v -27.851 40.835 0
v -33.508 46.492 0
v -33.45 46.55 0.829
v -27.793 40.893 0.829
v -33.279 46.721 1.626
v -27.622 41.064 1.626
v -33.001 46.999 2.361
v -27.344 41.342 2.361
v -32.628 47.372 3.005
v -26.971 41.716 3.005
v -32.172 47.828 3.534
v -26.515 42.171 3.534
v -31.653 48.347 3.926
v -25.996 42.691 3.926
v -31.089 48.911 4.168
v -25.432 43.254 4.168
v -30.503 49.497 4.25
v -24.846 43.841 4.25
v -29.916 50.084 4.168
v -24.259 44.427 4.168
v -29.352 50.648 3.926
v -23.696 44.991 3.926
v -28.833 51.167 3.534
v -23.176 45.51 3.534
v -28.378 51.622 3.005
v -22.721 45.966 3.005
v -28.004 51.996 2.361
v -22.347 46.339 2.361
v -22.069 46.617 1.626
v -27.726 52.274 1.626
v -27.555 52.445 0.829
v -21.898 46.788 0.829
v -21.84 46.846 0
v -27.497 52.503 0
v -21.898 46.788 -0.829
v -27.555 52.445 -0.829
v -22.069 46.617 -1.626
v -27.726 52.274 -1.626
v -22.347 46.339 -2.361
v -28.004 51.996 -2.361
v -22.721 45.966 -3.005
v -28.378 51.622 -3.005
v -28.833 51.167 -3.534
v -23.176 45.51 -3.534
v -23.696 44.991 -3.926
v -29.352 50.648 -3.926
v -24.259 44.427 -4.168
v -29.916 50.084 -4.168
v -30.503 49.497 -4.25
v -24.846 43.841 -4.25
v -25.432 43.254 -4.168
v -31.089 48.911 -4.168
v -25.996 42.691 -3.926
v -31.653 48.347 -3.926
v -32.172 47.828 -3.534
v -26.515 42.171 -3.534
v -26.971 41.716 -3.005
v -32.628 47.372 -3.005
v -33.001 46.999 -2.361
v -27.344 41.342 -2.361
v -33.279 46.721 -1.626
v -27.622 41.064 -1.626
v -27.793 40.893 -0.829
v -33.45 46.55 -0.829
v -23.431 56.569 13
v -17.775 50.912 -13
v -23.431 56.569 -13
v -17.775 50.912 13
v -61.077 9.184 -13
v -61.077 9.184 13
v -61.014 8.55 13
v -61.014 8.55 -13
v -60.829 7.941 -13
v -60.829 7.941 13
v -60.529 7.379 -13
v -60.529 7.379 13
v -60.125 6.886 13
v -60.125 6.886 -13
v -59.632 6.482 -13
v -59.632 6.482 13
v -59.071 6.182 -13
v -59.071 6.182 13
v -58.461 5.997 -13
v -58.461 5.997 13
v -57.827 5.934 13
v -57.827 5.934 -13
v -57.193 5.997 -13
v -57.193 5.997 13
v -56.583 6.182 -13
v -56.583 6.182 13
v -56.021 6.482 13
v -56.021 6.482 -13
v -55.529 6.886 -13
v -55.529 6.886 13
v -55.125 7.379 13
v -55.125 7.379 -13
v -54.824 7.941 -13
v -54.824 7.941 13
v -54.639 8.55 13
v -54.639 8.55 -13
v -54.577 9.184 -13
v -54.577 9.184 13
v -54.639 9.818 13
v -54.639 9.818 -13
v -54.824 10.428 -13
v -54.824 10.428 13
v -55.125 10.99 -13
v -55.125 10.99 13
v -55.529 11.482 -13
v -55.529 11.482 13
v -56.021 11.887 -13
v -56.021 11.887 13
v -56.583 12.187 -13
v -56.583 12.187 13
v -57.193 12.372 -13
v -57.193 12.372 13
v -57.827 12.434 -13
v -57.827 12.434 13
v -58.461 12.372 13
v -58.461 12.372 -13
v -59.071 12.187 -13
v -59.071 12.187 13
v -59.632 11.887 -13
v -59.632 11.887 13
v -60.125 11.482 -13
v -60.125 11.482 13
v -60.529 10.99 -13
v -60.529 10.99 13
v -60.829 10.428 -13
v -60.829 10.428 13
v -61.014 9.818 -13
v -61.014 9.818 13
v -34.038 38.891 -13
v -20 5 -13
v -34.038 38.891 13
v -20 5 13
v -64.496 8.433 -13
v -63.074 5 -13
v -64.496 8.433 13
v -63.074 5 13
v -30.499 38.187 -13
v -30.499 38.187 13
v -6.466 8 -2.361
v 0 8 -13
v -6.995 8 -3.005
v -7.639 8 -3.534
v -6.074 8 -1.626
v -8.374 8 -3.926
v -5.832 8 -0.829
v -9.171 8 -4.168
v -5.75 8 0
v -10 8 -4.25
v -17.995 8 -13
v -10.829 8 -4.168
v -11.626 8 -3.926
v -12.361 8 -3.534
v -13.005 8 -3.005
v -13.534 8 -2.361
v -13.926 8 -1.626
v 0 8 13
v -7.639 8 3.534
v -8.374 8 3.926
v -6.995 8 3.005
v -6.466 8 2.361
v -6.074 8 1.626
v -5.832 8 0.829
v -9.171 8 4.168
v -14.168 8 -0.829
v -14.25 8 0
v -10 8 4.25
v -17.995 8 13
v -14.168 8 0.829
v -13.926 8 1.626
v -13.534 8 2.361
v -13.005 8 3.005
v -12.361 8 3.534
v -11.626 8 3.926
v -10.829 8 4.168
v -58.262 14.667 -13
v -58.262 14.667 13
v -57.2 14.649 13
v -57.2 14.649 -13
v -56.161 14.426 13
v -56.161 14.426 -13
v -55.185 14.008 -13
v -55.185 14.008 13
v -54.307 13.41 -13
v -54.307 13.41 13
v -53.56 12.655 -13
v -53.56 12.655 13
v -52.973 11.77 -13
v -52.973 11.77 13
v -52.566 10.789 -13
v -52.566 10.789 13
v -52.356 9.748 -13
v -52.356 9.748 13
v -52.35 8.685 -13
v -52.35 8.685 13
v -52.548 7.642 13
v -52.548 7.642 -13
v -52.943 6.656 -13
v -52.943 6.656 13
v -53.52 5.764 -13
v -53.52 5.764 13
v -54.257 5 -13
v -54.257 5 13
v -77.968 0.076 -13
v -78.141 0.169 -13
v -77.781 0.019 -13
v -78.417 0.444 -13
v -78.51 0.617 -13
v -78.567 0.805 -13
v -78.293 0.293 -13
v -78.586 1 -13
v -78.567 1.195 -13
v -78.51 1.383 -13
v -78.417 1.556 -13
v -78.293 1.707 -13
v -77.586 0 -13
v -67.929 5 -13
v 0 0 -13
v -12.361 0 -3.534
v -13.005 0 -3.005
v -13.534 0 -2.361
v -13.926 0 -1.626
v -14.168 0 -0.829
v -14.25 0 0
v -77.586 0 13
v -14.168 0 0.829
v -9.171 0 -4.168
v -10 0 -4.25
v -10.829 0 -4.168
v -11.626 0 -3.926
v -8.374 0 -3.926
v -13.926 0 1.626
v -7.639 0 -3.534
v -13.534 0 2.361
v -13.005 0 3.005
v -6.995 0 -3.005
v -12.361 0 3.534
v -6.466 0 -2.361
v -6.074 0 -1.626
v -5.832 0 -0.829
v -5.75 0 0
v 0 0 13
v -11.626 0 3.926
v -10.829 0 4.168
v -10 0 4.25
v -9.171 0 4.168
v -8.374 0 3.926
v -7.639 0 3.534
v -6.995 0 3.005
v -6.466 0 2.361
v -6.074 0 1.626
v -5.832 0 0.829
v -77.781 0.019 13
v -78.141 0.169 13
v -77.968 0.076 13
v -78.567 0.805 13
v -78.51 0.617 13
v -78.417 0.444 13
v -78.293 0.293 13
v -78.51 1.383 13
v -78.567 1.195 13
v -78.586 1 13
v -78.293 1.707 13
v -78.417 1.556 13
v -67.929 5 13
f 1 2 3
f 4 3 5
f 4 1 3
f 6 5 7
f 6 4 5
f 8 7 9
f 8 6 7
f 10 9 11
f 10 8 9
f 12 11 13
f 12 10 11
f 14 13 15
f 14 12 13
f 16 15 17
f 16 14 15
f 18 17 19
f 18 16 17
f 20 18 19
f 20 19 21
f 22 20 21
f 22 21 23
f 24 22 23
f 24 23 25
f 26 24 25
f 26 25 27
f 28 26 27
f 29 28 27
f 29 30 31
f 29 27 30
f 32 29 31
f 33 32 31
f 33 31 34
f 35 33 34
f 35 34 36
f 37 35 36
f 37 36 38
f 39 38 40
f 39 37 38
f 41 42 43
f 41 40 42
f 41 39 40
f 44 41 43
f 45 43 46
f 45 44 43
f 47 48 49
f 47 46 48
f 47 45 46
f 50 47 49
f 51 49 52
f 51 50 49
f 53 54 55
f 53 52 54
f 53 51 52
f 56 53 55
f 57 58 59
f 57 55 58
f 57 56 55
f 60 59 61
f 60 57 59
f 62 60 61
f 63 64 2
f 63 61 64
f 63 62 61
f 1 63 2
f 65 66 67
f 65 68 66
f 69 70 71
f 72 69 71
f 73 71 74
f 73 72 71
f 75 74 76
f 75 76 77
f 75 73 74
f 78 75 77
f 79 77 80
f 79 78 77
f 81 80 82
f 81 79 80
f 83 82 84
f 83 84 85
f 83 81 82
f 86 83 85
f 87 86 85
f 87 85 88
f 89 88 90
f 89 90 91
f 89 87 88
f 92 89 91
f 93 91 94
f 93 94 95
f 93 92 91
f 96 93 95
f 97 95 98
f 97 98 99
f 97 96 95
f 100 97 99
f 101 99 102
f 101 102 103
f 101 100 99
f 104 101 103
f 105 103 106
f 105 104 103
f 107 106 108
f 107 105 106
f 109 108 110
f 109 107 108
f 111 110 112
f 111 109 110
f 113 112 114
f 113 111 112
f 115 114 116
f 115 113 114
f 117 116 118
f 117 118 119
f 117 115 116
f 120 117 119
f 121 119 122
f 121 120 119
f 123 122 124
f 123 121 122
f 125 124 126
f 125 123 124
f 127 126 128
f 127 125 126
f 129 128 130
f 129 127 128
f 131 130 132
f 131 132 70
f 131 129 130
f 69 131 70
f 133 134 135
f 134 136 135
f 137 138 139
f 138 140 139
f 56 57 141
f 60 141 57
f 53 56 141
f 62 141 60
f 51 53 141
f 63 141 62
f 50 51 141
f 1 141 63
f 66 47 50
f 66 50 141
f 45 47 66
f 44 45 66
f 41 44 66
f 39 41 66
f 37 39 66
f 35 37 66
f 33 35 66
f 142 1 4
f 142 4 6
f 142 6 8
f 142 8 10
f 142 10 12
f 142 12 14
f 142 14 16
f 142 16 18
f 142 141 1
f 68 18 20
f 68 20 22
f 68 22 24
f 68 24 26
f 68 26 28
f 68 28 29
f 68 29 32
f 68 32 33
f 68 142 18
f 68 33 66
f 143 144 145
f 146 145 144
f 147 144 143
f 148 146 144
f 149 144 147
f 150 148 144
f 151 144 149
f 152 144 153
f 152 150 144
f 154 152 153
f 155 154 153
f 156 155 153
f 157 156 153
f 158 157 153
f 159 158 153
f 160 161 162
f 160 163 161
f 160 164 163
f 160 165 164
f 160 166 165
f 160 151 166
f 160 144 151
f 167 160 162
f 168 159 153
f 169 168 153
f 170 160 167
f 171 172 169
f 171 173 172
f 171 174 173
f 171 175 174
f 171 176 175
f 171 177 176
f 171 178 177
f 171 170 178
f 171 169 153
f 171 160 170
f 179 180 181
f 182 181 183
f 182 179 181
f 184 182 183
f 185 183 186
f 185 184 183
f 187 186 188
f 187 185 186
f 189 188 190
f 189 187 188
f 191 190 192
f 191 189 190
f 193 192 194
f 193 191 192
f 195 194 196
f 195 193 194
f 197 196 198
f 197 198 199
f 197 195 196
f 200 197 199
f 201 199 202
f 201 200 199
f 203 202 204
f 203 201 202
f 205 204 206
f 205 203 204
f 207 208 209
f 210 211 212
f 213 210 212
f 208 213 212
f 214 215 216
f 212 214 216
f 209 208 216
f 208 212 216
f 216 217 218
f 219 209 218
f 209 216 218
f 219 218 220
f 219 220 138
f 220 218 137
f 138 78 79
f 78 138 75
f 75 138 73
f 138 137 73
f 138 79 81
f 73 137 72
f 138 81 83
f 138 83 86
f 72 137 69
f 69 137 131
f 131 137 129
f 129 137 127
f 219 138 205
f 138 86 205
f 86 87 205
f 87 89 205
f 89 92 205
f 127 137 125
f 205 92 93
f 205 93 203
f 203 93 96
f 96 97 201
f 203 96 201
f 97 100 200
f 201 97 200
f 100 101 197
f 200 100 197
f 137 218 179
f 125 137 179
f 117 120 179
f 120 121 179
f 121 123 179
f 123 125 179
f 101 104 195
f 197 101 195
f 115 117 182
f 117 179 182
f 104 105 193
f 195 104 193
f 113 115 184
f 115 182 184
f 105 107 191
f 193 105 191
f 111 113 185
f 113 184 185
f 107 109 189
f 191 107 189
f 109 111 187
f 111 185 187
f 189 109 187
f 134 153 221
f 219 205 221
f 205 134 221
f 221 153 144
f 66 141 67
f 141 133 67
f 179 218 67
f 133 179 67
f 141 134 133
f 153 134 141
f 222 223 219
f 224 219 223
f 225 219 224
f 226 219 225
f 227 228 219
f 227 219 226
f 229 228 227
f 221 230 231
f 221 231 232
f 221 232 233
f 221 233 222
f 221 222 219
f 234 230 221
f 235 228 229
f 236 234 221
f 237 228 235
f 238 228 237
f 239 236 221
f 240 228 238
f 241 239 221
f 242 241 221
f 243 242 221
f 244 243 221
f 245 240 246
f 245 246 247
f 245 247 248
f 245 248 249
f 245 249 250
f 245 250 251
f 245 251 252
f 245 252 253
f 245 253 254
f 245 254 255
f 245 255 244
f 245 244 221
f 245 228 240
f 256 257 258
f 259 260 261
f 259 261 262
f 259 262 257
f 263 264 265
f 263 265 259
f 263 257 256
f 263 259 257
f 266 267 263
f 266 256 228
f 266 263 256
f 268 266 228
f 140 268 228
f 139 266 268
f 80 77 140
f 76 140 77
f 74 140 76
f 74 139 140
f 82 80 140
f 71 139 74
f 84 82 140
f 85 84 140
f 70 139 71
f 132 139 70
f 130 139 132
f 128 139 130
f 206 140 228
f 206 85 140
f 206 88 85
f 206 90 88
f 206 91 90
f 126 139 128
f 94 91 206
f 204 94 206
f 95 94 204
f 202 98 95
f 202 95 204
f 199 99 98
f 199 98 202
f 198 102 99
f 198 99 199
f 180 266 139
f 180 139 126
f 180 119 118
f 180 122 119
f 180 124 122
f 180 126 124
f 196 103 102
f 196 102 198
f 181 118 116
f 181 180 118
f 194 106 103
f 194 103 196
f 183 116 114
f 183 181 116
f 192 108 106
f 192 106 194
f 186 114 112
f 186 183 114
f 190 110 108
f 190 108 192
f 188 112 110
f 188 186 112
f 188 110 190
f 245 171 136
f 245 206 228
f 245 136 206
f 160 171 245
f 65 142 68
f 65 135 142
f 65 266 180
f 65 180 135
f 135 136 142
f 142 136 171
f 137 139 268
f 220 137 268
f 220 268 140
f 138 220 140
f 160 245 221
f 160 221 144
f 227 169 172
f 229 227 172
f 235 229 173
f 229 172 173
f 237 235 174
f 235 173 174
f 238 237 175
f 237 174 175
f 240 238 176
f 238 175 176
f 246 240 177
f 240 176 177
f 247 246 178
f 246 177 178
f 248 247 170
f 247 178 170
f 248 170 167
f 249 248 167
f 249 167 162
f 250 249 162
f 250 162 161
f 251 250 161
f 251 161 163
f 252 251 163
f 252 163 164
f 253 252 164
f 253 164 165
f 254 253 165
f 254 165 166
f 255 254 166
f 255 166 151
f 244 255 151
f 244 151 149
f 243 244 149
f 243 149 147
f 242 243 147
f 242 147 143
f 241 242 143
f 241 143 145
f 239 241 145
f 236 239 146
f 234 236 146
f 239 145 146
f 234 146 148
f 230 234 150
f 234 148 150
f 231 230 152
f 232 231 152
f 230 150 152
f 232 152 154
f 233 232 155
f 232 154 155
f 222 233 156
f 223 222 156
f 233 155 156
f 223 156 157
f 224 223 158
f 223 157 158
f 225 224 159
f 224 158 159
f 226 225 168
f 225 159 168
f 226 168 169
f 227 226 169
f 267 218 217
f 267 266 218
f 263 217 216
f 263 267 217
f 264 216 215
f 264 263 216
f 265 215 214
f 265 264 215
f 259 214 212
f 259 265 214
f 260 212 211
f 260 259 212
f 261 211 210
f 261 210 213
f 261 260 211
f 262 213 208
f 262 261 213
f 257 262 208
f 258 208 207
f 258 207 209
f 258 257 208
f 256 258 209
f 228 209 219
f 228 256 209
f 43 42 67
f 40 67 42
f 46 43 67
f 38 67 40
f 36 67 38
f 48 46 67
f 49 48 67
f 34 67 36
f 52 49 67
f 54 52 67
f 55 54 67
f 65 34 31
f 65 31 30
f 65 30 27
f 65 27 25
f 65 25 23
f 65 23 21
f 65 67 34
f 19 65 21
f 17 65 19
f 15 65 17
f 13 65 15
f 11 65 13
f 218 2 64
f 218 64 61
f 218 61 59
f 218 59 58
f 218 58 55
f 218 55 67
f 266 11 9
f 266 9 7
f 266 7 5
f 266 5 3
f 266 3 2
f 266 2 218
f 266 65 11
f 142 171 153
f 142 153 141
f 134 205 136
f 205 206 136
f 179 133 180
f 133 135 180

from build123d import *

# Parameters (mm, degrees)
SKETCH_1_R          = 3.25
EXTRUDE_1_DEPTH     = 13
SKETCH_3_R          = 4.25
CUT_EXTRUDE_1_DEPTH = 17


with BuildPart() as part:
    # 草图1 → 凸台-拉伸1 (new, symmetric)
    with BuildSketch(Plane.XY):
        with BuildLine():
            Line((-77.585786438, 0), (0, 0))
            Line((0, 0), (0, 8))
            Line((0, 8), (-17.995464086, 8))
            Line((-17.995464086, 8), (-30.499317942, 38.186973559))
            Line((-30.499317942, 38.186973559), (-17.774603256, 50.911688245))
            Line((-17.774603256, 50.911688245), (-23.431457505, 56.568542495))
            Line((-23.431457505, 56.568542495), (-78.292893219, 1.707106781))
            ThreePointArc((-78.292893219, 1.707106781), (-78.50966597, 0.617316568), (-77.585786438, 0))
        make_face()
        with Locations(Location((-57.82689122, 9.184402377, 0), (0, 0, 180))):
            Circle(SKETCH_1_R, mode=Mode.SUBTRACT)
        Polygon((-67.928932188, 5), (-63.07447047, 5), (-64.496309389, 8.4326228), align=None, mode=Mode.SUBTRACT)
        with BuildLine():
            Line((-54.257468753, 5), (-20, 5))
            Line((-20, 5), (-34.038059223, 38.890872965))
            Line((-34.038059223, 38.890872965), (-58.261747684, 14.667184504))
            ThreePointArc((-58.261747684, 14.667184504), (-52.745553791, 11.289161255), (-54.257468753, 5))
        make_face(mode=Mode.SUBTRACT)
    extrude(amount=EXTRUDE_1_DEPTH, both=True)

    # 草图3 → 切除-拉伸1 (cut)
    with BuildSketch(Plane(origin=(0, 8, 0), x_dir=(1, 0, 0), z_dir=(0, 1, 0))):
        with Locations(Location((-10, 0, 0), (0, 0, 180))):
            Circle(SKETCH_3_R)
    cut_extrude_1 = extrude(amount=-CUT_EXTRUDE_1_DEPTH, mode=Mode.SUBTRACT)

    # 镜向1: 切除-拉伸1 across plane
    add(cut_extrude_1.mirror(Plane(origin=(-11.715728753, 28.284271247, 0), x_dir=(0, 0, 1), z_dir=(-0.3826834323650881, 0.9238795325112875, 0))), mode=Mode.SUBTRACT)


solid = part.part
